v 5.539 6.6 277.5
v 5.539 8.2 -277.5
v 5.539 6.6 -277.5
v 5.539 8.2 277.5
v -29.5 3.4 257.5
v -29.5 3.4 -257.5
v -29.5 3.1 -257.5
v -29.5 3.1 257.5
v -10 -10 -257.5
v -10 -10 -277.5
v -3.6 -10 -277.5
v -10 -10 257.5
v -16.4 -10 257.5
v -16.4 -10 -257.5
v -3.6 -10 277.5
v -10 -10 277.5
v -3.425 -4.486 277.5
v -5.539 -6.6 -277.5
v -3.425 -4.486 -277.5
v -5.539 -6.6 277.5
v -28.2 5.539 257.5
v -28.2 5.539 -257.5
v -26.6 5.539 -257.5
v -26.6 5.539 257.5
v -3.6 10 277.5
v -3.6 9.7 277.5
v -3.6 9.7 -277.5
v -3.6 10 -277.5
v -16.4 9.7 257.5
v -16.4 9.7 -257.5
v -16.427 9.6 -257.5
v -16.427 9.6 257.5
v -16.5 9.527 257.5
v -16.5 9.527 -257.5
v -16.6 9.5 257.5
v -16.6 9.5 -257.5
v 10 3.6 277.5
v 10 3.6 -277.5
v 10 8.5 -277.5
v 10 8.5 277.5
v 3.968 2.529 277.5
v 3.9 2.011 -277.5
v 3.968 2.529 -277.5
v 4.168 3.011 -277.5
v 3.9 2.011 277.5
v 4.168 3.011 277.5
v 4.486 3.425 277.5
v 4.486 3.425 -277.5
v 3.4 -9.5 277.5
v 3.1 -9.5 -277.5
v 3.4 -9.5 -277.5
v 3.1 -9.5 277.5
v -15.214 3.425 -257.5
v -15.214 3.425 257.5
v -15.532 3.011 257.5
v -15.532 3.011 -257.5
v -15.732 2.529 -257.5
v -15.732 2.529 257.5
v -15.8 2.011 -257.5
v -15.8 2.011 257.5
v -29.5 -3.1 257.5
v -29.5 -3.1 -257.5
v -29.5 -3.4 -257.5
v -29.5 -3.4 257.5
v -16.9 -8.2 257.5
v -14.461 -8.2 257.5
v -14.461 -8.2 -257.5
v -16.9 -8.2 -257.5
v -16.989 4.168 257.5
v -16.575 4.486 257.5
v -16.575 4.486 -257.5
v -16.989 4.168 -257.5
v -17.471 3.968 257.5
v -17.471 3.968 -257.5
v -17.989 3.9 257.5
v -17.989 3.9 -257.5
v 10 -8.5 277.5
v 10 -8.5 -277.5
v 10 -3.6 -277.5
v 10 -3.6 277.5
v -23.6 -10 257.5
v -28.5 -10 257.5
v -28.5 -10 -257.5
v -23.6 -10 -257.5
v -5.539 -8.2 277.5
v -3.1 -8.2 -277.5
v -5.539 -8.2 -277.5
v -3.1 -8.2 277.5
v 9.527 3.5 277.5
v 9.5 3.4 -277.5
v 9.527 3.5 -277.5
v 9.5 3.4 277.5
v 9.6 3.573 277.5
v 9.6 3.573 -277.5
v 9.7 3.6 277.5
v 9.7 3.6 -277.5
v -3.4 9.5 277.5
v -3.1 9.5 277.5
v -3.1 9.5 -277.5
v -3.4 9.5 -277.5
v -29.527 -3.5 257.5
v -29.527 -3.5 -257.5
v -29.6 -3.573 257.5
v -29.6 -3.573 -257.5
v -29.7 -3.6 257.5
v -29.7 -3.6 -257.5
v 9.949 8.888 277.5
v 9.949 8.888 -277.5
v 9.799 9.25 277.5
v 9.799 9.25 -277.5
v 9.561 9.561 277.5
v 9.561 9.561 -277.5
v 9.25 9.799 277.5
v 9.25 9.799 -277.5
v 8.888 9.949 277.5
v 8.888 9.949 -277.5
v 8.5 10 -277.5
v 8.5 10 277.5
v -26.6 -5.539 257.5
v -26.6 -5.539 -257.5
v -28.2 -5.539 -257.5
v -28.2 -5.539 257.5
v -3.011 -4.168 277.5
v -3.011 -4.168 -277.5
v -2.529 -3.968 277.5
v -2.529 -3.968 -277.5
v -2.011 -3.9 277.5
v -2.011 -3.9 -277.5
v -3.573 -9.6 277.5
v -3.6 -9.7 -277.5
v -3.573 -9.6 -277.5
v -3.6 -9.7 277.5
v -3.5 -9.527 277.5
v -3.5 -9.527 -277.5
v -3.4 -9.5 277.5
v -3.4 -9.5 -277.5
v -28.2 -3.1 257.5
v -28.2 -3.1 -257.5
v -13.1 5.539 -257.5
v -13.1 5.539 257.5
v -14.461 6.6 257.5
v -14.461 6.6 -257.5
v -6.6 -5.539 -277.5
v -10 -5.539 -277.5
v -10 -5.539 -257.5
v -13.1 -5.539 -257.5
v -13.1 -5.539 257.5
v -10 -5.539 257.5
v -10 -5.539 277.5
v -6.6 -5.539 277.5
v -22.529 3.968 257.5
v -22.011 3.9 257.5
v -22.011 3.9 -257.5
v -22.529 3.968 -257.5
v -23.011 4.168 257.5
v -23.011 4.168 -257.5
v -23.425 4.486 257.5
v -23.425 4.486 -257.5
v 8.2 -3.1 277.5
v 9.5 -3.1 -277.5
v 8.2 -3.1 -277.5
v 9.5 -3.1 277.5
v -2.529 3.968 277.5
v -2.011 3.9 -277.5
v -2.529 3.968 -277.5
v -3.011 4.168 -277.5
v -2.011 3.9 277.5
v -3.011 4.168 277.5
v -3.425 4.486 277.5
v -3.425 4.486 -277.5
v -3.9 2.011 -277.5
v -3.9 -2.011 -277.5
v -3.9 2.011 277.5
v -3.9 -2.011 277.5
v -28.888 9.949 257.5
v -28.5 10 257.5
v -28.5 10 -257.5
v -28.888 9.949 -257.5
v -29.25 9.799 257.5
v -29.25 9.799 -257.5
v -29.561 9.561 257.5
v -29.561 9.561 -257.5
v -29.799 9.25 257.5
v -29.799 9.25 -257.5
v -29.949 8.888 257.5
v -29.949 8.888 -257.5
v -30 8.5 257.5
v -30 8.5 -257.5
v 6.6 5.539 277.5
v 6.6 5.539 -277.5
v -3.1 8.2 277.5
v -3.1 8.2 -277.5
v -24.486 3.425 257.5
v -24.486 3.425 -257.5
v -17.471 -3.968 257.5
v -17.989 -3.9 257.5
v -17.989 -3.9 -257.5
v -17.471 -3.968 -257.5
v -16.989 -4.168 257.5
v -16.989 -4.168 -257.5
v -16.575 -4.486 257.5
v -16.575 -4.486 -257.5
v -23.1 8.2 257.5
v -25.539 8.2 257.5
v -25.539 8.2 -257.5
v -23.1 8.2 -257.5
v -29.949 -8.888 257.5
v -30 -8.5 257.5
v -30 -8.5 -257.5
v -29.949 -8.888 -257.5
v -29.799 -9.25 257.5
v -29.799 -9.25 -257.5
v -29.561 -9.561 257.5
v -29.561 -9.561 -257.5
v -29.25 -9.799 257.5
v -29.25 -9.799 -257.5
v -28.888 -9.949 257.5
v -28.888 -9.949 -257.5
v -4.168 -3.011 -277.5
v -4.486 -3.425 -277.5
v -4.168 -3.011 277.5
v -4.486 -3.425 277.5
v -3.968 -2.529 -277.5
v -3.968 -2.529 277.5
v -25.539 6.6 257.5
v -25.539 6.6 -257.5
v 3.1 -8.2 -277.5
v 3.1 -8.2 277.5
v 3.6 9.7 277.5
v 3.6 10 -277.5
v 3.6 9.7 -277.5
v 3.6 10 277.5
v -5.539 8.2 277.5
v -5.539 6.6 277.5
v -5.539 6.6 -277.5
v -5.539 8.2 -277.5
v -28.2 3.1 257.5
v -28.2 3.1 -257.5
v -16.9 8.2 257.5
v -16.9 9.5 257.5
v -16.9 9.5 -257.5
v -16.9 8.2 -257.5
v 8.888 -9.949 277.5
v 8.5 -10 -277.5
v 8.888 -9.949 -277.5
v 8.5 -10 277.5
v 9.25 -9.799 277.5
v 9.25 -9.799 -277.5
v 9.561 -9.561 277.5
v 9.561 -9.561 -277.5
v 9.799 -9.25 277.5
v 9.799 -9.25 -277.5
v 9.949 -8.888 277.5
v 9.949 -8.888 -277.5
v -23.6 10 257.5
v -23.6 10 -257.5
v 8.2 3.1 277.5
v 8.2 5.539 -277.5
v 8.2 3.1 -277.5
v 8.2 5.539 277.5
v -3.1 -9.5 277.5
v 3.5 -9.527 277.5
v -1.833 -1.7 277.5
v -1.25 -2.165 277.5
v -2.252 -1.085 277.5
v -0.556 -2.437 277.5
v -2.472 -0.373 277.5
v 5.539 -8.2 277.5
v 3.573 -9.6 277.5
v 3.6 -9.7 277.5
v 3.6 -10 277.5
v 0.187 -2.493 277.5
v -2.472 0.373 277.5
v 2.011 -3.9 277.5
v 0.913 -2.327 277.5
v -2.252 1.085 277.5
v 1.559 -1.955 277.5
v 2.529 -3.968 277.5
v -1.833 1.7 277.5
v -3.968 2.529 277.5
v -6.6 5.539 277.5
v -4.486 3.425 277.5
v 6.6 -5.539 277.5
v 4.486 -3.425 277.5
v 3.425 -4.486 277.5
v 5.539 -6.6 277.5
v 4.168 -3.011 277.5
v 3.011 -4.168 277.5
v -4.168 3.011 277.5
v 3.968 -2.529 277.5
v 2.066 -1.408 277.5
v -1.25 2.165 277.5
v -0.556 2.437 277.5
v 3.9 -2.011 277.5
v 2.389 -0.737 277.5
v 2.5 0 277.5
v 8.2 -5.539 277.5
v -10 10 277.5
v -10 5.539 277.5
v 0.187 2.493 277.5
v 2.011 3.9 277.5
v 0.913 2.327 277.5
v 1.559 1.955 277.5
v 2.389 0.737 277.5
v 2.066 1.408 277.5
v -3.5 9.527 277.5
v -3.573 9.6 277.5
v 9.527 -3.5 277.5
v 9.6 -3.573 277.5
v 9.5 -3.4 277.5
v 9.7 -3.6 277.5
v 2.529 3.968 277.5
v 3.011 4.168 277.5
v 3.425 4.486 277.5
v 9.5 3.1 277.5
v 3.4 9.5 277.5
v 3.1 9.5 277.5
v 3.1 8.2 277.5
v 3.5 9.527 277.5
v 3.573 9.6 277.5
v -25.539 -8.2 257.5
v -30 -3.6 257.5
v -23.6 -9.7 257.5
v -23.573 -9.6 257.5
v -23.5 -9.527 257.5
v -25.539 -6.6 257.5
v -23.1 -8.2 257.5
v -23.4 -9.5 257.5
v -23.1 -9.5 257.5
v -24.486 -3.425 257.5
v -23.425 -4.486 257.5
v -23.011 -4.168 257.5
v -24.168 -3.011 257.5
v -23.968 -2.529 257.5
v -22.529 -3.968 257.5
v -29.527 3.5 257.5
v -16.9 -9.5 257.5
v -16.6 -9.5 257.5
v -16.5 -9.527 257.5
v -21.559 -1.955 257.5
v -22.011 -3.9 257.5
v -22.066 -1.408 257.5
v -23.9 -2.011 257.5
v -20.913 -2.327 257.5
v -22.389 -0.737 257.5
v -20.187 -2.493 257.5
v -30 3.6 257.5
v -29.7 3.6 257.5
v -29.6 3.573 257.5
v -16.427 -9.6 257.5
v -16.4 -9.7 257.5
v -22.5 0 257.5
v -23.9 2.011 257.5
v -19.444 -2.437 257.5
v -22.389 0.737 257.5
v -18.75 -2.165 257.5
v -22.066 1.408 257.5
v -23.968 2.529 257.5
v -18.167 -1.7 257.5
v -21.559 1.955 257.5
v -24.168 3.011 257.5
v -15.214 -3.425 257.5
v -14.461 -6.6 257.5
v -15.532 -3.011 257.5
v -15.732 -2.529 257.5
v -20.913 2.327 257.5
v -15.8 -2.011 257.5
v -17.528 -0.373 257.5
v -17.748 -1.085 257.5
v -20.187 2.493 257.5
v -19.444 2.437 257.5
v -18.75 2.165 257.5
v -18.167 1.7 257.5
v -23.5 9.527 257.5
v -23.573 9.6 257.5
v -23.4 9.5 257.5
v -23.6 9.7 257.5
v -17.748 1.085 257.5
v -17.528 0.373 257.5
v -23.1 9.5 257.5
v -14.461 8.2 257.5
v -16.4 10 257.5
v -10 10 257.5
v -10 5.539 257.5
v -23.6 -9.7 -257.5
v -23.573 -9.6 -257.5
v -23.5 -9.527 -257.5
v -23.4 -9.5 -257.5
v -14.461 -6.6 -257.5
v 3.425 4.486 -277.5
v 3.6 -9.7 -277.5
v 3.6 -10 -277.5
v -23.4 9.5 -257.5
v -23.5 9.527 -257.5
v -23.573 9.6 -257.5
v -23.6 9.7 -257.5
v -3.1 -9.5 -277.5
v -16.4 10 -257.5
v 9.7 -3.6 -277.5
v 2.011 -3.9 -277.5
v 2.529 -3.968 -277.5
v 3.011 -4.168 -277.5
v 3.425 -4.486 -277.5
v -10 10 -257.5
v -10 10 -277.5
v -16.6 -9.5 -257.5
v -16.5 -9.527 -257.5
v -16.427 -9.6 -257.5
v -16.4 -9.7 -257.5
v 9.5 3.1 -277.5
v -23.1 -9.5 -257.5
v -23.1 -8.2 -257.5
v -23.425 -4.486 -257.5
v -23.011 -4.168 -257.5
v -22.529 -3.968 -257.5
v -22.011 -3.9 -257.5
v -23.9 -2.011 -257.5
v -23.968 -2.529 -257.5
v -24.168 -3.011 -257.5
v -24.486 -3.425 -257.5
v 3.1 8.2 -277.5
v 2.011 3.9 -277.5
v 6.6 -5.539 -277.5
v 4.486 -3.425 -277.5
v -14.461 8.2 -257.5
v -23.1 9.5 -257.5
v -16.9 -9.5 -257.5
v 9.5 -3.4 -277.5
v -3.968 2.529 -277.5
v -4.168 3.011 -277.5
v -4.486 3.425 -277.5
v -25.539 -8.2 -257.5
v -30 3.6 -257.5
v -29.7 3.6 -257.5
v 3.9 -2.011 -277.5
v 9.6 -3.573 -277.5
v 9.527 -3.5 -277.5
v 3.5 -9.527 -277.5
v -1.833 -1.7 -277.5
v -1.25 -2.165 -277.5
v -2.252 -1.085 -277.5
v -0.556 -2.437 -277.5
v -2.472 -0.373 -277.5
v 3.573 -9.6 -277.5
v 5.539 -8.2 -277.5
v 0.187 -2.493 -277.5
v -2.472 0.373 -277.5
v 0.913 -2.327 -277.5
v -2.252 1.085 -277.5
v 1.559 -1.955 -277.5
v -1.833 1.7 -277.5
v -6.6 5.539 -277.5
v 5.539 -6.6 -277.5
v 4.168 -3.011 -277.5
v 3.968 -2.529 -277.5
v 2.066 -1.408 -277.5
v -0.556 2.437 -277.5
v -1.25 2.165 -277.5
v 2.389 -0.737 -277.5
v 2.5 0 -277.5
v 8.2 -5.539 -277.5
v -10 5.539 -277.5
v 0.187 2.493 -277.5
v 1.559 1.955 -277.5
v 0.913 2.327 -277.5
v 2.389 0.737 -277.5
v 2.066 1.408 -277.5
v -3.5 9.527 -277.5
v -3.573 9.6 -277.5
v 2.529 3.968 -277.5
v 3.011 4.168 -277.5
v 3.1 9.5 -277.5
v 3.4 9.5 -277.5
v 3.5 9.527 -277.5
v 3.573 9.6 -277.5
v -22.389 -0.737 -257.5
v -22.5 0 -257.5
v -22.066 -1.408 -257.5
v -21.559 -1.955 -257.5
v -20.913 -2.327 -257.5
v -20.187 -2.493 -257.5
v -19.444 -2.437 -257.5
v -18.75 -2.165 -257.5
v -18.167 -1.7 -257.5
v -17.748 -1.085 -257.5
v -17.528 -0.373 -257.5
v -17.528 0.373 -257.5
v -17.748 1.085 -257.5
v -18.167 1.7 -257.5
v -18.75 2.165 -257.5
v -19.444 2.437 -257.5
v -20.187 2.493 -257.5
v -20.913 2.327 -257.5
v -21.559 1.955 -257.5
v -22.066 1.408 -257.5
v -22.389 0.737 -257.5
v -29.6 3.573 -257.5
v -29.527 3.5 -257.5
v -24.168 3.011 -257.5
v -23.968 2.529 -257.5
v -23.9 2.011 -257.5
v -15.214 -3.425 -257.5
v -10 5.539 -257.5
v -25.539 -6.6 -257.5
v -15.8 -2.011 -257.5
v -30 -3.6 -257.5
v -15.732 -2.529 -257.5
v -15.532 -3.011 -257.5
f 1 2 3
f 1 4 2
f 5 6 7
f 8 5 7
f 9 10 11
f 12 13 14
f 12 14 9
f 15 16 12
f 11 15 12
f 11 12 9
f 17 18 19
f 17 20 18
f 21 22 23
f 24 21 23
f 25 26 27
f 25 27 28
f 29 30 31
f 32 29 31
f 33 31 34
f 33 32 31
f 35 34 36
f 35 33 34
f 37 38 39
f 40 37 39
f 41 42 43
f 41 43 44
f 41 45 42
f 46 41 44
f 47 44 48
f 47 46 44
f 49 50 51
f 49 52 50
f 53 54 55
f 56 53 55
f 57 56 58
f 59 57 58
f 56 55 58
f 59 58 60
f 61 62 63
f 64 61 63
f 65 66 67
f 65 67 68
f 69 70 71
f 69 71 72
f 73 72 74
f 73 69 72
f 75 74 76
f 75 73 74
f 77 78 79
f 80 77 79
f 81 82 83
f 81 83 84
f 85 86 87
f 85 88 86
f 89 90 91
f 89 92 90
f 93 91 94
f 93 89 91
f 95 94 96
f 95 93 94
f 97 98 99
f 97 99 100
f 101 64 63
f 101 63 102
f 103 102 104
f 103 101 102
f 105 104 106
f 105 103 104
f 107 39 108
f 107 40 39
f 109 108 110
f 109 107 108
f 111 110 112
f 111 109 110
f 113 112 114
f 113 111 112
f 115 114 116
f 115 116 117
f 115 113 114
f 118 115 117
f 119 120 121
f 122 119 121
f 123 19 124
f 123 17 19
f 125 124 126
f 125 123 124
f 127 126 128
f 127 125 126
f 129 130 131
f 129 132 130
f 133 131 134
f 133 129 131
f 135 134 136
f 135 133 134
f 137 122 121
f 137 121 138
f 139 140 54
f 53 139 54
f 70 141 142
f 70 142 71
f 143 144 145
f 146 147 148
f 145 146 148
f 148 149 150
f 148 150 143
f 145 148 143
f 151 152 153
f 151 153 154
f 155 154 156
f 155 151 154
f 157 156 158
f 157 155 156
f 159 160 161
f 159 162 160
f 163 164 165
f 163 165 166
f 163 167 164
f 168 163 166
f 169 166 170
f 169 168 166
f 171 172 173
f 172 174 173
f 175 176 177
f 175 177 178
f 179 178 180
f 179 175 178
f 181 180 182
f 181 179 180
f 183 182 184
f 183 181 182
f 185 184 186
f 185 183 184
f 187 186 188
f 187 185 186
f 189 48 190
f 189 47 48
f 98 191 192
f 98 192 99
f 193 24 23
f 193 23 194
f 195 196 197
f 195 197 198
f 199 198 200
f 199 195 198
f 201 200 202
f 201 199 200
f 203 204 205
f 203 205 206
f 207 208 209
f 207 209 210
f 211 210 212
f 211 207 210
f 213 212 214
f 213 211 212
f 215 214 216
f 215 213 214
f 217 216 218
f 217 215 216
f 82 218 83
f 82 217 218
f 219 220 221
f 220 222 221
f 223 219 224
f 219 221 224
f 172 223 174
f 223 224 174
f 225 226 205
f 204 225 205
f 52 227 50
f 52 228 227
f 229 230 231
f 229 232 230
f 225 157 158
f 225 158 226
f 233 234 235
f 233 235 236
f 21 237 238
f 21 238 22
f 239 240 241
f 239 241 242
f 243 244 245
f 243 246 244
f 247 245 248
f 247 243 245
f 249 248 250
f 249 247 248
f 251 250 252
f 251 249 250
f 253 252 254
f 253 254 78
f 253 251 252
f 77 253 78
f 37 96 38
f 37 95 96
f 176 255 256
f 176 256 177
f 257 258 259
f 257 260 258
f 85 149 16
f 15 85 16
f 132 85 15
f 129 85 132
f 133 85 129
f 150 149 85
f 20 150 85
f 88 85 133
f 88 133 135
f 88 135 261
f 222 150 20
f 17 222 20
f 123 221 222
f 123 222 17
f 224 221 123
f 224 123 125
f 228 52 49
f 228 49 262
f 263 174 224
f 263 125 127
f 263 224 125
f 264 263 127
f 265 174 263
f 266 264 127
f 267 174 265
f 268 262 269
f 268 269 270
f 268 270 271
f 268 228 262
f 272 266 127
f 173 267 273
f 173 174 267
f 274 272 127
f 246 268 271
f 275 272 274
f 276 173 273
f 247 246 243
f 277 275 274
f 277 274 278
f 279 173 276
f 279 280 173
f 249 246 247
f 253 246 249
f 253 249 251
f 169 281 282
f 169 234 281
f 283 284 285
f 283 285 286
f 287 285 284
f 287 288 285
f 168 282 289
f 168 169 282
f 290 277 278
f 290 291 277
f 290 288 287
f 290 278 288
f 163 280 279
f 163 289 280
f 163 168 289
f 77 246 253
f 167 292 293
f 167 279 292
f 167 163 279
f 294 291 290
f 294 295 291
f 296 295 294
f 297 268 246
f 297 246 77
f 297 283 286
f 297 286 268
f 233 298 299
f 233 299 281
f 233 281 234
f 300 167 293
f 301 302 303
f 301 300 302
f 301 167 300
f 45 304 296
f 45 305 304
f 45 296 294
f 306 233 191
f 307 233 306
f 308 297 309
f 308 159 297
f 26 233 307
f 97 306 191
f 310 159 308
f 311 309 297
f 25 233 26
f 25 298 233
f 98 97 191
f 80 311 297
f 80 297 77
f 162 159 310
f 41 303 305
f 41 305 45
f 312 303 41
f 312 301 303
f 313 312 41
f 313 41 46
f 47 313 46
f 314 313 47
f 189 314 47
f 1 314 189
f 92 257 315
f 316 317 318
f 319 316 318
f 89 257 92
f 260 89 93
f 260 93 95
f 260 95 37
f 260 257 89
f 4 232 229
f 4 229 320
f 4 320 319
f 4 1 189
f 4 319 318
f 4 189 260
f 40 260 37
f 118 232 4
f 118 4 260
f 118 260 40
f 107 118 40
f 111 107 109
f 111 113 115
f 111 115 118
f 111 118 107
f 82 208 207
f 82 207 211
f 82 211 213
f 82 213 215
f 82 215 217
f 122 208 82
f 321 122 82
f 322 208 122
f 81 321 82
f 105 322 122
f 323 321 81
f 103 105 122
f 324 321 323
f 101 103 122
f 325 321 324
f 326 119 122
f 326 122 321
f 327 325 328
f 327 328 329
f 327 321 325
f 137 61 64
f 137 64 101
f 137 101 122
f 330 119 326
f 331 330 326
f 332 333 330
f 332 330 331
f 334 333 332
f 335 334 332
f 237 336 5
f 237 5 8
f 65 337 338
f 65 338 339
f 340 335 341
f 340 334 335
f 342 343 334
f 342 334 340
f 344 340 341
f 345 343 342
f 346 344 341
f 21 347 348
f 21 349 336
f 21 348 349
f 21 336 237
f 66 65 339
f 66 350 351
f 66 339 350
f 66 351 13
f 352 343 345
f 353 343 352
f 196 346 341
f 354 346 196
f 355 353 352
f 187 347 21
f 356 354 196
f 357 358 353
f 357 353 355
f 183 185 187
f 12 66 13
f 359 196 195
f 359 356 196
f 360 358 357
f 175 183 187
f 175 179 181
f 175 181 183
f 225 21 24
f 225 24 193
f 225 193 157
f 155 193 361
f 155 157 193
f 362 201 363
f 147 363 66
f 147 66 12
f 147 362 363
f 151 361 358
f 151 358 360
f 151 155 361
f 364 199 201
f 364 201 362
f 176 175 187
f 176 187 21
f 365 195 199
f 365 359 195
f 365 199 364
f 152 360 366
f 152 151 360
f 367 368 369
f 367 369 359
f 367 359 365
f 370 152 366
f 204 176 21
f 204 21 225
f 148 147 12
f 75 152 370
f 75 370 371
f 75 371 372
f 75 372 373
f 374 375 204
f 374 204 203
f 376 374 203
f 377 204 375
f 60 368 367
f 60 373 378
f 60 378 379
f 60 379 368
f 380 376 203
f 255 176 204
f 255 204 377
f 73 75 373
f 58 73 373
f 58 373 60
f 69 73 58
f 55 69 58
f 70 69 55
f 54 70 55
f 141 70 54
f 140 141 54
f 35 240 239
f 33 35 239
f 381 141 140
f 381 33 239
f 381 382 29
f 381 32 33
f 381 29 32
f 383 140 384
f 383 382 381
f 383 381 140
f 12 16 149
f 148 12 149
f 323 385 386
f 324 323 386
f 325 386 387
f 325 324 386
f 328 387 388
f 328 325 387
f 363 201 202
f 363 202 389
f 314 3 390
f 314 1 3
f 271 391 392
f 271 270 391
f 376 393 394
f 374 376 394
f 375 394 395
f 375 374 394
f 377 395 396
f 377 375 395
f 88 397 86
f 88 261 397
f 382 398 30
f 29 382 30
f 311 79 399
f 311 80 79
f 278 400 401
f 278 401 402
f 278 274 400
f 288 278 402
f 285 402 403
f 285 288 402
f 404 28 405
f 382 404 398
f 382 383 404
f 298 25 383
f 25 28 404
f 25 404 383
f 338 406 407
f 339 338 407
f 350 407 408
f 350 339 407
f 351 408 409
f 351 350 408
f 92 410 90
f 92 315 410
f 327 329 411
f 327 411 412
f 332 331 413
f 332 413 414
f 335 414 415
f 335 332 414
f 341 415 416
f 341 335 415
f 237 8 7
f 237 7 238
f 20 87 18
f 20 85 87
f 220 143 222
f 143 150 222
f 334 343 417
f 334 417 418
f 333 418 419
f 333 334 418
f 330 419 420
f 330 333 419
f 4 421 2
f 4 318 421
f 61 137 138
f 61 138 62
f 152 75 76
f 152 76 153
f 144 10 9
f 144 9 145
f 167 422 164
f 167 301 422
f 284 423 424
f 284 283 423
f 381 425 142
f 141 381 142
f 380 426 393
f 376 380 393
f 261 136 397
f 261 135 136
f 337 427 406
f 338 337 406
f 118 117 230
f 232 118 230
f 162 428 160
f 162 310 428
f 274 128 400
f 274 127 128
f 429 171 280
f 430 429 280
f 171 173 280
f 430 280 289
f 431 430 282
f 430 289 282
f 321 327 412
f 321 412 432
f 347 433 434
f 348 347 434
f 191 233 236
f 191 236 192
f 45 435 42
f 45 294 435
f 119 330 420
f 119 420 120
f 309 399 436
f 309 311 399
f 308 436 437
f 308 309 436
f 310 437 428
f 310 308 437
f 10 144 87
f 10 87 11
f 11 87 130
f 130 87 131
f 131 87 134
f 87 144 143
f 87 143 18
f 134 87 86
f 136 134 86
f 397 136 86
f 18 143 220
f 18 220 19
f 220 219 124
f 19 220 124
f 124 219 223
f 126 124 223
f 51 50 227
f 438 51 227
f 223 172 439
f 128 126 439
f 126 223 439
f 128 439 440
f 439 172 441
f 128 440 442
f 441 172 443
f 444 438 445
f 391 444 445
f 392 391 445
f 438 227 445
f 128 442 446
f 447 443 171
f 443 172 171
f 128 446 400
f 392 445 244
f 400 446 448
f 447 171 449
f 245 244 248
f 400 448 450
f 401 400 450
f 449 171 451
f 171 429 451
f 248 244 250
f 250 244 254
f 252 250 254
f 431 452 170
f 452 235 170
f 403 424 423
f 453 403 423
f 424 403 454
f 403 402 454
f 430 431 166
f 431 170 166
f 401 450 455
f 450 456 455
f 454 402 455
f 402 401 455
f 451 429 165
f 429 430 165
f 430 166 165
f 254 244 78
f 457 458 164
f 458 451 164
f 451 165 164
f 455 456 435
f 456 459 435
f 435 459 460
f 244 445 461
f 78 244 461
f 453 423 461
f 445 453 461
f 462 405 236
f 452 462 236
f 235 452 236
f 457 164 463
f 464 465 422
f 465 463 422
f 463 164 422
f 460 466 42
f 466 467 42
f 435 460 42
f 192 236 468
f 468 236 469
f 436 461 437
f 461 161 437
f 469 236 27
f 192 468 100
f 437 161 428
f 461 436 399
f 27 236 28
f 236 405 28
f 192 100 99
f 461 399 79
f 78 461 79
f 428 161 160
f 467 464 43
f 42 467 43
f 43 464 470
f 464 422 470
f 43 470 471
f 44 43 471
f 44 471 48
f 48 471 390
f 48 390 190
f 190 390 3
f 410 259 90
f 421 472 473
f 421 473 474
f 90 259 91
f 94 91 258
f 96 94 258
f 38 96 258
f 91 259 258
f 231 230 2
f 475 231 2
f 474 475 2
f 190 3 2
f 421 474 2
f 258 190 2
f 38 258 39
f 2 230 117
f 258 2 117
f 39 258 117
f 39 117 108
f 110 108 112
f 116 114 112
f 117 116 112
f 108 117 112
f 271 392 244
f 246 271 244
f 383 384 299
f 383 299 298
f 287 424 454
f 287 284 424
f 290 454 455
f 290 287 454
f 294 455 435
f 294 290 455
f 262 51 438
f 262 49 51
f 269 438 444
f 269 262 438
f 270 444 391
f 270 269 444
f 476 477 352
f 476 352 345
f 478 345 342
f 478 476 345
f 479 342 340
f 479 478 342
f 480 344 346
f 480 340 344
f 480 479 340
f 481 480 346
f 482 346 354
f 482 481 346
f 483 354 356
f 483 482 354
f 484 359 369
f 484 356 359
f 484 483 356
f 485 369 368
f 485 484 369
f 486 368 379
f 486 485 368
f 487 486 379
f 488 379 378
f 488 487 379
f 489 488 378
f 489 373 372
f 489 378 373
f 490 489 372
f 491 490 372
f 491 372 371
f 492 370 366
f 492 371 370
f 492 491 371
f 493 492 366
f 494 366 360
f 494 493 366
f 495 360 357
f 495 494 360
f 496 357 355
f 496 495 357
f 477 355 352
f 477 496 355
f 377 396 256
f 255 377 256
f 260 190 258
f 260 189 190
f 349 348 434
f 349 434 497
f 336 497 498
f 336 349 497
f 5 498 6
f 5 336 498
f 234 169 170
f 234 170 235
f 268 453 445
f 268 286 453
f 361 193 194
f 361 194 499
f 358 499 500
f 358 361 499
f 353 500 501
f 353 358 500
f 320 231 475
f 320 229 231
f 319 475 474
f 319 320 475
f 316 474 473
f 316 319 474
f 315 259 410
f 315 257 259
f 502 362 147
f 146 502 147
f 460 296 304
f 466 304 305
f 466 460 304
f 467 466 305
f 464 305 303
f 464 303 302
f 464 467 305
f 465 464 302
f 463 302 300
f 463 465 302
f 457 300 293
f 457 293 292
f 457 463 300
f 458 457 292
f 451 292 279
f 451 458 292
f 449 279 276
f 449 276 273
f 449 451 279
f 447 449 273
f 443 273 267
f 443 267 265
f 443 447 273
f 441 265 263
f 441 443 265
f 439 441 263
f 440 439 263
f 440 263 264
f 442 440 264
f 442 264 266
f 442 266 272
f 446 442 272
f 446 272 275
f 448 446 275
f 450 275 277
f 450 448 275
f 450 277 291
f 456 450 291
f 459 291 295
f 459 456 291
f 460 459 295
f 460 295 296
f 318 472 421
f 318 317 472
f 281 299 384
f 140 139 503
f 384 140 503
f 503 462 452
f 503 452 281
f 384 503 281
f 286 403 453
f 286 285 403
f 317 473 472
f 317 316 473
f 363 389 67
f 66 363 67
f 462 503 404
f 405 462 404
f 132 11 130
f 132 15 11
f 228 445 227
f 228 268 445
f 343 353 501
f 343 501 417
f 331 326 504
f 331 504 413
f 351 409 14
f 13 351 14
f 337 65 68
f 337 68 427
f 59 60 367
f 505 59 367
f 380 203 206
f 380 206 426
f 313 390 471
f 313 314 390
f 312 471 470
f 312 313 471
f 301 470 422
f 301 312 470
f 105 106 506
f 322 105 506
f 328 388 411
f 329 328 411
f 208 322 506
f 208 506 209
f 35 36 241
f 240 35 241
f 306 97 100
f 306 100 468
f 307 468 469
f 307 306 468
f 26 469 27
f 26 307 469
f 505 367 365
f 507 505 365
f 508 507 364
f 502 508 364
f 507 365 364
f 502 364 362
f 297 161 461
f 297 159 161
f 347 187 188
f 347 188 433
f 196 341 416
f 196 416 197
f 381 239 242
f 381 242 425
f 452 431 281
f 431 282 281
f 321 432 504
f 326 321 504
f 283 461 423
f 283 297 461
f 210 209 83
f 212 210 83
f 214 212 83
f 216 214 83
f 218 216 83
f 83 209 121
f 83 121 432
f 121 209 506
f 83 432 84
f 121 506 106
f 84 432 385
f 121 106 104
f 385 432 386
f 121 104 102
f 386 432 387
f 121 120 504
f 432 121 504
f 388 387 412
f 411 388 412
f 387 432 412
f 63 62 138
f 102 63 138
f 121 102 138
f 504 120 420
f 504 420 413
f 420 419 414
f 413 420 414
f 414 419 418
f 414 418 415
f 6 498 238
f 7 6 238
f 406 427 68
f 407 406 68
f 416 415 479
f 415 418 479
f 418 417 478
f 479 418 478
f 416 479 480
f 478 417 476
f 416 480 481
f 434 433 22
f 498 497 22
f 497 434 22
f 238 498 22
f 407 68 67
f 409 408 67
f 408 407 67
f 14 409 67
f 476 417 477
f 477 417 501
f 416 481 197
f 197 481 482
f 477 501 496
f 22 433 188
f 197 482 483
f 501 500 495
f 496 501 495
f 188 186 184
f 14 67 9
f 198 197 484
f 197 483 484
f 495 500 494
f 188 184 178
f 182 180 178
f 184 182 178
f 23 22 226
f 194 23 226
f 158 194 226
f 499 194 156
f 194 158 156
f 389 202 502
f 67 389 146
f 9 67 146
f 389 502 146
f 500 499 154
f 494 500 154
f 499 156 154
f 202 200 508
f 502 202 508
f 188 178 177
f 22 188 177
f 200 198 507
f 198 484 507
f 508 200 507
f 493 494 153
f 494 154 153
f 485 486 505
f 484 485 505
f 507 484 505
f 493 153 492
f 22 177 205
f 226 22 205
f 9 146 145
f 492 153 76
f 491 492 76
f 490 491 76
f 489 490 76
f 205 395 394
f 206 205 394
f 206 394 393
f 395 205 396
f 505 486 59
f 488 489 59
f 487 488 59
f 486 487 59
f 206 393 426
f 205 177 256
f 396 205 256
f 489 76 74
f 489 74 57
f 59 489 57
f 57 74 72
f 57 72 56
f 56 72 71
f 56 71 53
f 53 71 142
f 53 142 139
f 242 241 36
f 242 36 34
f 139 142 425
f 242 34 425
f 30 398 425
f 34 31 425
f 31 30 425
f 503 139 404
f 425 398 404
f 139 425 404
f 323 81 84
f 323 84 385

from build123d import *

# Parameters (mm, degrees)
SKETCH1_R               = 2.5
EXTRUDE1_DEPTH          = 277.5
CUT_EXTRUDE1_DEPTH      = 556.900170894
CUT_EXTRUDE1_DEPTH_BACK = 556.900170894
SKETCH2_W               = 3.3
SKETCH2_H               = 11.078679656
SKETCH3_W               = 21.963498752
SKETCH3_H               = 21.444138823
CUT_EXTRUDE2_DEPTH      = 20


with BuildPart() as part:
    # Sketch1 → Extrude1 (new, symmetric)
    with BuildSketch(Plane.XY):
        with BuildLine():
            Line((0, 3.9), (-2.010912703, 3.9))
            ThreePointArc((-2.010912703, 3.9), (-2.776279568, 4.052240935), (-3.425126266, 4.485786438))
            Line((-3.425126266, 4.485786438), (-5.539339828, 6.6))
            Line((-5.539339828, 6.6), (-5.539339828, 8.2))
            Line((-5.539339828, 8.2), (-3.1, 8.2))
            Line((-3.1, 8.2), (-3.1, 9.5))
            Line((-3.1, 9.5), (-3.4, 9.5))
            ThreePointArc((-3.4, 9.5), (-3.541421356, 9.558578644), (-3.6, 9.7))
            Line((-3.6, 9.7), (-3.6, 10))
            Line((-3.6, 10), (-8.5, 10))
            Line((-8.5, 10), (-11.5, 10))
            Line((-11.5, 10), (-16.4, 10))
            Line((-16.4, 10), (-16.4, 9.7))
            ThreePointArc((-16.4, 9.7), (-16.458578644, 9.558578644), (-16.6, 9.5))
            Line((-16.6, 9.5), (-16.9, 9.5))
            Line((-16.9, 9.5), (-16.9, 8.2))
            Line((-16.9, 8.2), (-14.460660172, 8.2))
            Line((-14.460660172, 8.2), (-14.460660172, 6.6))
            Line((-14.460660172, 6.6), (-16.574873734, 4.485786438))
            ThreePointArc((-16.574873734, 4.485786438), (-17.223720432, 4.052240935), (-17.989087297, 3.9))
            Line((-17.989087297, 3.9), (-20, 3.9))
            Line((-20, 3.9), (-22.010912703, 3.9))
            ThreePointArc((-22.010912703, 3.9), (-22.776279568, 4.052240935), (-23.425126266, 4.485786438))
            Line((-23.425126266, 4.485786438), (-25.539339828, 6.6))
            Line((-25.539339828, 6.6), (-25.539339828, 8.2))
            Line((-25.539339828, 8.2), (-23.1, 8.2))
            Line((-23.1, 8.2), (-23.1, 9.5))
            Line((-23.1, 9.5), (-23.4, 9.5))
            ThreePointArc((-23.4, 9.5), (-23.541421356, 9.558578644), (-23.6, 9.7))
            Line((-23.6, 9.7), (-23.6, 10))
            Line((-23.6, 10), (-28.5, 10))
            ThreePointArc((-28.5, 10), (-29.560660172, 9.560660172), (-30, 8.5))
            Line((-30, 8.5), (-30, 3.6))
            Line((-30, 3.6), (-29.7, 3.6))
            ThreePointArc((-29.7, 3.6), (-29.558578644, 3.541421356), (-29.5, 3.4))
            Line((-29.5, 3.4), (-29.5, 3.1))
            Line((-29.5, 3.1), (-28.2, 3.1))
            Line((-28.2, 3.1), (-28.2, 5.539339828))
            Line((-28.2, 5.539339828), (-26.6, 5.539339828))
            Line((-26.6, 5.539339828), (-24.485786438, 3.425126266))
            ThreePointArc((-24.485786438, 3.425126266), (-24.052240935, 2.776279568), (-23.9, 2.010912703))
            Line((-23.9, 2.010912703), (-23.9, 0))
            Line((-23.9, 0), (-23.9, -2.010912703))
            ThreePointArc((-23.9, -2.010912703), (-24.052240935, -2.776279568), (-24.485786438, -3.425126266))
            Line((-24.485786438, -3.425126266), (-26.6, -5.539339828))
            Line((-26.6, -5.539339828), (-28.2, -5.539339828))
            Line((-28.2, -5.539339828), (-28.2, -3.1))
            Line((-28.2, -3.1), (-29.5, -3.1))
            Line((-29.5, -3.1), (-29.5, -3.4))
            ThreePointArc((-29.5, -3.4), (-29.558578644, -3.541421356), (-29.7, -3.6))
            Line((-29.7, -3.6), (-30, -3.6))
            Line((-30, -3.6), (-30, -8.5))
            ThreePointArc((-30, -8.5), (-29.560660172, -9.560660172), (-28.5, -10))
            Line((-28.5, -10), (-23.6, -10))
            Line((-23.6, -10), (-23.6, -9.7))
            ThreePointArc((-23.6, -9.7), (-23.541421356, -9.558578644), (-23.4, -9.5))
            Line((-23.4, -9.5), (-23.1, -9.5))
            Line((-23.1, -9.5), (-23.1, -8.2))
            Line((-23.1, -8.2), (-25.539339828, -8.2))
            Line((-25.539339828, -8.2), (-25.539339828, -6.6))
            Line((-25.539339828, -6.6), (-23.425126266, -4.485786438))
            ThreePointArc((-23.425126266, -4.485786438), (-22.776279568, -4.052240935), (-22.010912703, -3.9))
            Line((-22.010912703, -3.9), (-20, -3.9))
            Line((-20, -3.9), (-17.989087297, -3.9))
            ThreePointArc((-17.989087297, -3.9), (-17.223720432, -4.052240935), (-16.574873734, -4.485786438))
            Line((-16.574873734, -4.485786438), (-14.460660172, -6.6))
            Line((-14.460660172, -6.6), (-14.460660172, -8.2))
            Line((-14.460660172, -8.2), (-16.9, -8.2))
            Line((-16.9, -8.2), (-16.9, -9.5))
            Line((-16.9, -9.5), (-16.6, -9.5))
            ThreePointArc((-16.6, -9.5), (-16.458578644, -9.558578644), (-16.4, -9.7))
            Line((-16.4, -9.7), (-16.4, -10))
            Line((-16.4, -10), (-11.5, -10))
            Line((-11.5, -10), (-8.5, -10))
            Line((-8.5, -10), (-3.6, -10))
            Line((-3.6, -10), (-3.6, -9.7))
            ThreePointArc((-3.6, -9.7), (-3.541421356, -9.558578644), (-3.4, -9.5))
            Line((-3.4, -9.5), (-3.1, -9.5))
            Line((-3.1, -9.5), (-3.1, -8.2))
            Line((-3.1, -8.2), (-5.539339828, -8.2))
            Line((-5.539339828, -8.2), (-5.539339828, -6.6))
            Line((-5.539339828, -6.6), (-3.425126266, -4.485786438))
            ThreePointArc((-3.425126266, -4.485786438), (-2.776279568, -4.052240935), (-2.010912703, -3.9))
            Line((-2.010912703, -3.9), (0, -3.9))
            Line((0, -3.9), (2.010912703, -3.9))
            ThreePointArc((2.010912703, -3.9), (2.776279568, -4.052240935), (3.425126266, -4.485786438))
            Line((3.425126266, -4.485786438), (5.539339828, -6.6))
            Line((5.539339828, -6.6), (5.539339828, -8.2))
            Line((5.539339828, -8.2), (3.1, -8.2))
            Line((3.1, -8.2), (3.1, -9.5))
            Line((3.1, -9.5), (3.4, -9.5))
            ThreePointArc((3.4, -9.5), (3.541421356, -9.558578644), (3.6, -9.7))
            Line((3.6, -9.7), (3.6, -10))
            Line((3.6, -10), (8.5, -10))
            ThreePointArc((8.5, -10), (9.560660172, -9.560660172), (10, -8.5))
            Line((10, -8.5), (10, -3.6))
            Line((10, -3.6), (9.7, -3.6))
            ThreePointArc((9.7, -3.6), (9.558578644, -3.541421356), (9.5, -3.4))
            Line((9.5, -3.4), (9.5, -3.1))
            Line((9.5, -3.1), (8.2, -3.1))
            Line((8.2, -3.1), (8.2, -5.539339828))
            Line((8.2, -5.539339828), (6.6, -5.539339828))
            Line((6.6, -5.539339828), (4.485786438, -3.425126266))
            ThreePointArc((4.485786438, -3.425126266), (4.052240935, -2.776279568), (3.9, -2.010912703))
            Line((3.9, -2.010912703), (3.9, 0))
            Line((3.9, 0), (3.9, 2.010912703))
            ThreePointArc((3.9, 2.010912703), (4.052240935, 2.776279568), (4.485786438, 3.425126266))
            Line((4.485786438, 3.425126266), (6.6, 5.539339828))
            Line((6.6, 5.539339828), (8.2, 5.539339828))
            Line((8.2, 5.539339828), (8.2, 3.1))
            Line((8.2, 3.1), (9.5, 3.1))
            Line((9.5, 3.1), (9.5, 3.4))
            ThreePointArc((9.5, 3.4), (9.558578644, 3.541421356), (9.7, 3.6))
            Line((9.7, 3.6), (10, 3.6))
            Line((10, 3.6), (10, 8.5))
            ThreePointArc((10, 8.5), (9.560660172, 9.560660172), (8.5, 10))
            Line((8.5, 10), (3.6, 10))
            Line((3.6, 10), (3.6, 9.7))
            ThreePointArc((3.6, 9.7), (3.541421356, 9.558578644), (3.4, 9.5))
            Line((3.4, 9.5), (3.1, 9.5))
            Line((3.1, 9.5), (3.1, 8.2))
            Line((3.1, 8.2), (5.539339828, 8.2))
            Line((5.539339828, 8.2), (5.539339828, 6.6))
            Line((5.539339828, 6.6), (3.425126266, 4.485786438))
            ThreePointArc((3.425126266, 4.485786438), (2.776279568, 4.052240935), (2.010912703, 3.9))
            Line((2.010912703, 3.9), (0, 3.9))
        make_face()
        Circle(SKETCH1_R, mode=Mode.SUBTRACT)
        with Locations(Location((-20, 0, 0), (0, 0, 180))):
            Circle(SKETCH1_R, mode=Mode.SUBTRACT)
        with BuildLine():
            Line((-9.7, 3.6), (-10, 3.6))
            ThreePointArc((-10, 3.6), (-10.141421356, 3.541421356), (-10.2, 3.4))
            Line((-10.2, 3.4), (-10.2, 3.1))
            Line((-10.2, 3.1), (-11.5, 3.1))
            Line((-11.5, 3.1), (-11.5, 5.539339828))
            Line((-11.5, 5.539339828), (-13.1, 5.539339828))
            Line((-13.1, 5.539339828), (-15.214213562, 3.425126266))
            ThreePointArc((-15.214213562, 3.425126266), (-15.647759065, 2.776279568), (-15.8, 2.010912703))
            Line((-15.8, 2.010912703), (-15.8, 0))
            Line((-15.8, 0), (-15.8, -2.010912703))
            ThreePointArc((-15.8, -2.010912703), (-15.647759065, -2.776279568), (-15.214213562, -3.425126266))
            Line((-15.214213562, -3.425126266), (-13.1, -5.539339828))
            Line((-13.1, -5.539339828), (-11.5, -5.539339828))
            Line((-11.5, -5.539339828), (-11.5, -3.1))
            Line((-11.5, -3.1), (-10.2, -3.1))
            Line((-10.2, -3.1), (-10.2, -3.4))
            ThreePointArc((-10.2, -3.4), (-10.141421356, -3.541421356), (-10, -3.6))
            Line((-10, -3.6), (-9.7, -3.6))
            ThreePointArc((-9.7, -3.6), (-9.558578644, -3.541421356), (-9.5, -3.4))
            Line((-9.5, -3.4), (-9.5, -3.1))
            Line((-9.5, -3.1), (-8.2, -3.1))
            Line((-8.2, -3.1), (-8.2, -5.539339828))
            Line((-8.2, -5.539339828), (-6.6, -5.539339828))
            Line((-6.6, -5.539339828), (-4.485786438, -3.425126266))
            ThreePointArc((-4.485786438, -3.425126266), (-4.052240935, -2.776279568), (-3.9, -2.010912703))
            Line((-3.9, -2.010912703), (-3.9, 0))
            Line((-3.9, 0), (-3.9, 2.010912703))
            ThreePointArc((-3.9, 2.010912703), (-4.052240935, 2.776279568), (-4.485786438, 3.425126266))
            Line((-4.485786438, 3.425126266), (-6.6, 5.539339828))
            Line((-6.6, 5.539339828), (-8.2, 5.539339828))
            Line((-8.2, 5.539339828), (-8.2, 3.1))
            Line((-8.2, 3.1), (-9.5, 3.1))
            Line((-9.5, 3.1), (-9.5, 3.4))
            ThreePointArc((-9.5, 3.4), (-9.558578644, 3.541421356), (-9.7, 3.6))
        make_face(mode=Mode.SUBTRACT)
    extrude(amount=EXTRUDE1_DEPTH, both=True)

    # Sketch2 → Cut-Extrude1 (cut, two sides: drawn at the far end of the back side and taken through both)
    with BuildSketch(Plane.XY.offset(277.5).offset(-CUT_EXTRUDE1_DEPTH_BACK)):
        with Locations((-9.85, 0)):
            Rectangle(SKETCH2_W, SKETCH2_H)
    extrude(amount=CUT_EXTRUDE1_DEPTH + CUT_EXTRUDE1_DEPTH_BACK, mode=Mode.SUBTRACT)

    # Sketch3 → Cut-Extrude2 (cut)
    with BuildSketch(Plane.XY.offset(277.5)):
        with Locations((-20.981749376, 0.722069412)):
            Rectangle(SKETCH3_W, SKETCH3_H)
    cut_extrude2 = extrude(amount=-CUT_EXTRUDE2_DEPTH, mode=Mode.SUBTRACT)

    # Mirror1: Cut-Extrude2 across plane
    add(cut_extrude2.mirror(Plane.XY), mode=Mode.SUBTRACT)


solid = part.part
